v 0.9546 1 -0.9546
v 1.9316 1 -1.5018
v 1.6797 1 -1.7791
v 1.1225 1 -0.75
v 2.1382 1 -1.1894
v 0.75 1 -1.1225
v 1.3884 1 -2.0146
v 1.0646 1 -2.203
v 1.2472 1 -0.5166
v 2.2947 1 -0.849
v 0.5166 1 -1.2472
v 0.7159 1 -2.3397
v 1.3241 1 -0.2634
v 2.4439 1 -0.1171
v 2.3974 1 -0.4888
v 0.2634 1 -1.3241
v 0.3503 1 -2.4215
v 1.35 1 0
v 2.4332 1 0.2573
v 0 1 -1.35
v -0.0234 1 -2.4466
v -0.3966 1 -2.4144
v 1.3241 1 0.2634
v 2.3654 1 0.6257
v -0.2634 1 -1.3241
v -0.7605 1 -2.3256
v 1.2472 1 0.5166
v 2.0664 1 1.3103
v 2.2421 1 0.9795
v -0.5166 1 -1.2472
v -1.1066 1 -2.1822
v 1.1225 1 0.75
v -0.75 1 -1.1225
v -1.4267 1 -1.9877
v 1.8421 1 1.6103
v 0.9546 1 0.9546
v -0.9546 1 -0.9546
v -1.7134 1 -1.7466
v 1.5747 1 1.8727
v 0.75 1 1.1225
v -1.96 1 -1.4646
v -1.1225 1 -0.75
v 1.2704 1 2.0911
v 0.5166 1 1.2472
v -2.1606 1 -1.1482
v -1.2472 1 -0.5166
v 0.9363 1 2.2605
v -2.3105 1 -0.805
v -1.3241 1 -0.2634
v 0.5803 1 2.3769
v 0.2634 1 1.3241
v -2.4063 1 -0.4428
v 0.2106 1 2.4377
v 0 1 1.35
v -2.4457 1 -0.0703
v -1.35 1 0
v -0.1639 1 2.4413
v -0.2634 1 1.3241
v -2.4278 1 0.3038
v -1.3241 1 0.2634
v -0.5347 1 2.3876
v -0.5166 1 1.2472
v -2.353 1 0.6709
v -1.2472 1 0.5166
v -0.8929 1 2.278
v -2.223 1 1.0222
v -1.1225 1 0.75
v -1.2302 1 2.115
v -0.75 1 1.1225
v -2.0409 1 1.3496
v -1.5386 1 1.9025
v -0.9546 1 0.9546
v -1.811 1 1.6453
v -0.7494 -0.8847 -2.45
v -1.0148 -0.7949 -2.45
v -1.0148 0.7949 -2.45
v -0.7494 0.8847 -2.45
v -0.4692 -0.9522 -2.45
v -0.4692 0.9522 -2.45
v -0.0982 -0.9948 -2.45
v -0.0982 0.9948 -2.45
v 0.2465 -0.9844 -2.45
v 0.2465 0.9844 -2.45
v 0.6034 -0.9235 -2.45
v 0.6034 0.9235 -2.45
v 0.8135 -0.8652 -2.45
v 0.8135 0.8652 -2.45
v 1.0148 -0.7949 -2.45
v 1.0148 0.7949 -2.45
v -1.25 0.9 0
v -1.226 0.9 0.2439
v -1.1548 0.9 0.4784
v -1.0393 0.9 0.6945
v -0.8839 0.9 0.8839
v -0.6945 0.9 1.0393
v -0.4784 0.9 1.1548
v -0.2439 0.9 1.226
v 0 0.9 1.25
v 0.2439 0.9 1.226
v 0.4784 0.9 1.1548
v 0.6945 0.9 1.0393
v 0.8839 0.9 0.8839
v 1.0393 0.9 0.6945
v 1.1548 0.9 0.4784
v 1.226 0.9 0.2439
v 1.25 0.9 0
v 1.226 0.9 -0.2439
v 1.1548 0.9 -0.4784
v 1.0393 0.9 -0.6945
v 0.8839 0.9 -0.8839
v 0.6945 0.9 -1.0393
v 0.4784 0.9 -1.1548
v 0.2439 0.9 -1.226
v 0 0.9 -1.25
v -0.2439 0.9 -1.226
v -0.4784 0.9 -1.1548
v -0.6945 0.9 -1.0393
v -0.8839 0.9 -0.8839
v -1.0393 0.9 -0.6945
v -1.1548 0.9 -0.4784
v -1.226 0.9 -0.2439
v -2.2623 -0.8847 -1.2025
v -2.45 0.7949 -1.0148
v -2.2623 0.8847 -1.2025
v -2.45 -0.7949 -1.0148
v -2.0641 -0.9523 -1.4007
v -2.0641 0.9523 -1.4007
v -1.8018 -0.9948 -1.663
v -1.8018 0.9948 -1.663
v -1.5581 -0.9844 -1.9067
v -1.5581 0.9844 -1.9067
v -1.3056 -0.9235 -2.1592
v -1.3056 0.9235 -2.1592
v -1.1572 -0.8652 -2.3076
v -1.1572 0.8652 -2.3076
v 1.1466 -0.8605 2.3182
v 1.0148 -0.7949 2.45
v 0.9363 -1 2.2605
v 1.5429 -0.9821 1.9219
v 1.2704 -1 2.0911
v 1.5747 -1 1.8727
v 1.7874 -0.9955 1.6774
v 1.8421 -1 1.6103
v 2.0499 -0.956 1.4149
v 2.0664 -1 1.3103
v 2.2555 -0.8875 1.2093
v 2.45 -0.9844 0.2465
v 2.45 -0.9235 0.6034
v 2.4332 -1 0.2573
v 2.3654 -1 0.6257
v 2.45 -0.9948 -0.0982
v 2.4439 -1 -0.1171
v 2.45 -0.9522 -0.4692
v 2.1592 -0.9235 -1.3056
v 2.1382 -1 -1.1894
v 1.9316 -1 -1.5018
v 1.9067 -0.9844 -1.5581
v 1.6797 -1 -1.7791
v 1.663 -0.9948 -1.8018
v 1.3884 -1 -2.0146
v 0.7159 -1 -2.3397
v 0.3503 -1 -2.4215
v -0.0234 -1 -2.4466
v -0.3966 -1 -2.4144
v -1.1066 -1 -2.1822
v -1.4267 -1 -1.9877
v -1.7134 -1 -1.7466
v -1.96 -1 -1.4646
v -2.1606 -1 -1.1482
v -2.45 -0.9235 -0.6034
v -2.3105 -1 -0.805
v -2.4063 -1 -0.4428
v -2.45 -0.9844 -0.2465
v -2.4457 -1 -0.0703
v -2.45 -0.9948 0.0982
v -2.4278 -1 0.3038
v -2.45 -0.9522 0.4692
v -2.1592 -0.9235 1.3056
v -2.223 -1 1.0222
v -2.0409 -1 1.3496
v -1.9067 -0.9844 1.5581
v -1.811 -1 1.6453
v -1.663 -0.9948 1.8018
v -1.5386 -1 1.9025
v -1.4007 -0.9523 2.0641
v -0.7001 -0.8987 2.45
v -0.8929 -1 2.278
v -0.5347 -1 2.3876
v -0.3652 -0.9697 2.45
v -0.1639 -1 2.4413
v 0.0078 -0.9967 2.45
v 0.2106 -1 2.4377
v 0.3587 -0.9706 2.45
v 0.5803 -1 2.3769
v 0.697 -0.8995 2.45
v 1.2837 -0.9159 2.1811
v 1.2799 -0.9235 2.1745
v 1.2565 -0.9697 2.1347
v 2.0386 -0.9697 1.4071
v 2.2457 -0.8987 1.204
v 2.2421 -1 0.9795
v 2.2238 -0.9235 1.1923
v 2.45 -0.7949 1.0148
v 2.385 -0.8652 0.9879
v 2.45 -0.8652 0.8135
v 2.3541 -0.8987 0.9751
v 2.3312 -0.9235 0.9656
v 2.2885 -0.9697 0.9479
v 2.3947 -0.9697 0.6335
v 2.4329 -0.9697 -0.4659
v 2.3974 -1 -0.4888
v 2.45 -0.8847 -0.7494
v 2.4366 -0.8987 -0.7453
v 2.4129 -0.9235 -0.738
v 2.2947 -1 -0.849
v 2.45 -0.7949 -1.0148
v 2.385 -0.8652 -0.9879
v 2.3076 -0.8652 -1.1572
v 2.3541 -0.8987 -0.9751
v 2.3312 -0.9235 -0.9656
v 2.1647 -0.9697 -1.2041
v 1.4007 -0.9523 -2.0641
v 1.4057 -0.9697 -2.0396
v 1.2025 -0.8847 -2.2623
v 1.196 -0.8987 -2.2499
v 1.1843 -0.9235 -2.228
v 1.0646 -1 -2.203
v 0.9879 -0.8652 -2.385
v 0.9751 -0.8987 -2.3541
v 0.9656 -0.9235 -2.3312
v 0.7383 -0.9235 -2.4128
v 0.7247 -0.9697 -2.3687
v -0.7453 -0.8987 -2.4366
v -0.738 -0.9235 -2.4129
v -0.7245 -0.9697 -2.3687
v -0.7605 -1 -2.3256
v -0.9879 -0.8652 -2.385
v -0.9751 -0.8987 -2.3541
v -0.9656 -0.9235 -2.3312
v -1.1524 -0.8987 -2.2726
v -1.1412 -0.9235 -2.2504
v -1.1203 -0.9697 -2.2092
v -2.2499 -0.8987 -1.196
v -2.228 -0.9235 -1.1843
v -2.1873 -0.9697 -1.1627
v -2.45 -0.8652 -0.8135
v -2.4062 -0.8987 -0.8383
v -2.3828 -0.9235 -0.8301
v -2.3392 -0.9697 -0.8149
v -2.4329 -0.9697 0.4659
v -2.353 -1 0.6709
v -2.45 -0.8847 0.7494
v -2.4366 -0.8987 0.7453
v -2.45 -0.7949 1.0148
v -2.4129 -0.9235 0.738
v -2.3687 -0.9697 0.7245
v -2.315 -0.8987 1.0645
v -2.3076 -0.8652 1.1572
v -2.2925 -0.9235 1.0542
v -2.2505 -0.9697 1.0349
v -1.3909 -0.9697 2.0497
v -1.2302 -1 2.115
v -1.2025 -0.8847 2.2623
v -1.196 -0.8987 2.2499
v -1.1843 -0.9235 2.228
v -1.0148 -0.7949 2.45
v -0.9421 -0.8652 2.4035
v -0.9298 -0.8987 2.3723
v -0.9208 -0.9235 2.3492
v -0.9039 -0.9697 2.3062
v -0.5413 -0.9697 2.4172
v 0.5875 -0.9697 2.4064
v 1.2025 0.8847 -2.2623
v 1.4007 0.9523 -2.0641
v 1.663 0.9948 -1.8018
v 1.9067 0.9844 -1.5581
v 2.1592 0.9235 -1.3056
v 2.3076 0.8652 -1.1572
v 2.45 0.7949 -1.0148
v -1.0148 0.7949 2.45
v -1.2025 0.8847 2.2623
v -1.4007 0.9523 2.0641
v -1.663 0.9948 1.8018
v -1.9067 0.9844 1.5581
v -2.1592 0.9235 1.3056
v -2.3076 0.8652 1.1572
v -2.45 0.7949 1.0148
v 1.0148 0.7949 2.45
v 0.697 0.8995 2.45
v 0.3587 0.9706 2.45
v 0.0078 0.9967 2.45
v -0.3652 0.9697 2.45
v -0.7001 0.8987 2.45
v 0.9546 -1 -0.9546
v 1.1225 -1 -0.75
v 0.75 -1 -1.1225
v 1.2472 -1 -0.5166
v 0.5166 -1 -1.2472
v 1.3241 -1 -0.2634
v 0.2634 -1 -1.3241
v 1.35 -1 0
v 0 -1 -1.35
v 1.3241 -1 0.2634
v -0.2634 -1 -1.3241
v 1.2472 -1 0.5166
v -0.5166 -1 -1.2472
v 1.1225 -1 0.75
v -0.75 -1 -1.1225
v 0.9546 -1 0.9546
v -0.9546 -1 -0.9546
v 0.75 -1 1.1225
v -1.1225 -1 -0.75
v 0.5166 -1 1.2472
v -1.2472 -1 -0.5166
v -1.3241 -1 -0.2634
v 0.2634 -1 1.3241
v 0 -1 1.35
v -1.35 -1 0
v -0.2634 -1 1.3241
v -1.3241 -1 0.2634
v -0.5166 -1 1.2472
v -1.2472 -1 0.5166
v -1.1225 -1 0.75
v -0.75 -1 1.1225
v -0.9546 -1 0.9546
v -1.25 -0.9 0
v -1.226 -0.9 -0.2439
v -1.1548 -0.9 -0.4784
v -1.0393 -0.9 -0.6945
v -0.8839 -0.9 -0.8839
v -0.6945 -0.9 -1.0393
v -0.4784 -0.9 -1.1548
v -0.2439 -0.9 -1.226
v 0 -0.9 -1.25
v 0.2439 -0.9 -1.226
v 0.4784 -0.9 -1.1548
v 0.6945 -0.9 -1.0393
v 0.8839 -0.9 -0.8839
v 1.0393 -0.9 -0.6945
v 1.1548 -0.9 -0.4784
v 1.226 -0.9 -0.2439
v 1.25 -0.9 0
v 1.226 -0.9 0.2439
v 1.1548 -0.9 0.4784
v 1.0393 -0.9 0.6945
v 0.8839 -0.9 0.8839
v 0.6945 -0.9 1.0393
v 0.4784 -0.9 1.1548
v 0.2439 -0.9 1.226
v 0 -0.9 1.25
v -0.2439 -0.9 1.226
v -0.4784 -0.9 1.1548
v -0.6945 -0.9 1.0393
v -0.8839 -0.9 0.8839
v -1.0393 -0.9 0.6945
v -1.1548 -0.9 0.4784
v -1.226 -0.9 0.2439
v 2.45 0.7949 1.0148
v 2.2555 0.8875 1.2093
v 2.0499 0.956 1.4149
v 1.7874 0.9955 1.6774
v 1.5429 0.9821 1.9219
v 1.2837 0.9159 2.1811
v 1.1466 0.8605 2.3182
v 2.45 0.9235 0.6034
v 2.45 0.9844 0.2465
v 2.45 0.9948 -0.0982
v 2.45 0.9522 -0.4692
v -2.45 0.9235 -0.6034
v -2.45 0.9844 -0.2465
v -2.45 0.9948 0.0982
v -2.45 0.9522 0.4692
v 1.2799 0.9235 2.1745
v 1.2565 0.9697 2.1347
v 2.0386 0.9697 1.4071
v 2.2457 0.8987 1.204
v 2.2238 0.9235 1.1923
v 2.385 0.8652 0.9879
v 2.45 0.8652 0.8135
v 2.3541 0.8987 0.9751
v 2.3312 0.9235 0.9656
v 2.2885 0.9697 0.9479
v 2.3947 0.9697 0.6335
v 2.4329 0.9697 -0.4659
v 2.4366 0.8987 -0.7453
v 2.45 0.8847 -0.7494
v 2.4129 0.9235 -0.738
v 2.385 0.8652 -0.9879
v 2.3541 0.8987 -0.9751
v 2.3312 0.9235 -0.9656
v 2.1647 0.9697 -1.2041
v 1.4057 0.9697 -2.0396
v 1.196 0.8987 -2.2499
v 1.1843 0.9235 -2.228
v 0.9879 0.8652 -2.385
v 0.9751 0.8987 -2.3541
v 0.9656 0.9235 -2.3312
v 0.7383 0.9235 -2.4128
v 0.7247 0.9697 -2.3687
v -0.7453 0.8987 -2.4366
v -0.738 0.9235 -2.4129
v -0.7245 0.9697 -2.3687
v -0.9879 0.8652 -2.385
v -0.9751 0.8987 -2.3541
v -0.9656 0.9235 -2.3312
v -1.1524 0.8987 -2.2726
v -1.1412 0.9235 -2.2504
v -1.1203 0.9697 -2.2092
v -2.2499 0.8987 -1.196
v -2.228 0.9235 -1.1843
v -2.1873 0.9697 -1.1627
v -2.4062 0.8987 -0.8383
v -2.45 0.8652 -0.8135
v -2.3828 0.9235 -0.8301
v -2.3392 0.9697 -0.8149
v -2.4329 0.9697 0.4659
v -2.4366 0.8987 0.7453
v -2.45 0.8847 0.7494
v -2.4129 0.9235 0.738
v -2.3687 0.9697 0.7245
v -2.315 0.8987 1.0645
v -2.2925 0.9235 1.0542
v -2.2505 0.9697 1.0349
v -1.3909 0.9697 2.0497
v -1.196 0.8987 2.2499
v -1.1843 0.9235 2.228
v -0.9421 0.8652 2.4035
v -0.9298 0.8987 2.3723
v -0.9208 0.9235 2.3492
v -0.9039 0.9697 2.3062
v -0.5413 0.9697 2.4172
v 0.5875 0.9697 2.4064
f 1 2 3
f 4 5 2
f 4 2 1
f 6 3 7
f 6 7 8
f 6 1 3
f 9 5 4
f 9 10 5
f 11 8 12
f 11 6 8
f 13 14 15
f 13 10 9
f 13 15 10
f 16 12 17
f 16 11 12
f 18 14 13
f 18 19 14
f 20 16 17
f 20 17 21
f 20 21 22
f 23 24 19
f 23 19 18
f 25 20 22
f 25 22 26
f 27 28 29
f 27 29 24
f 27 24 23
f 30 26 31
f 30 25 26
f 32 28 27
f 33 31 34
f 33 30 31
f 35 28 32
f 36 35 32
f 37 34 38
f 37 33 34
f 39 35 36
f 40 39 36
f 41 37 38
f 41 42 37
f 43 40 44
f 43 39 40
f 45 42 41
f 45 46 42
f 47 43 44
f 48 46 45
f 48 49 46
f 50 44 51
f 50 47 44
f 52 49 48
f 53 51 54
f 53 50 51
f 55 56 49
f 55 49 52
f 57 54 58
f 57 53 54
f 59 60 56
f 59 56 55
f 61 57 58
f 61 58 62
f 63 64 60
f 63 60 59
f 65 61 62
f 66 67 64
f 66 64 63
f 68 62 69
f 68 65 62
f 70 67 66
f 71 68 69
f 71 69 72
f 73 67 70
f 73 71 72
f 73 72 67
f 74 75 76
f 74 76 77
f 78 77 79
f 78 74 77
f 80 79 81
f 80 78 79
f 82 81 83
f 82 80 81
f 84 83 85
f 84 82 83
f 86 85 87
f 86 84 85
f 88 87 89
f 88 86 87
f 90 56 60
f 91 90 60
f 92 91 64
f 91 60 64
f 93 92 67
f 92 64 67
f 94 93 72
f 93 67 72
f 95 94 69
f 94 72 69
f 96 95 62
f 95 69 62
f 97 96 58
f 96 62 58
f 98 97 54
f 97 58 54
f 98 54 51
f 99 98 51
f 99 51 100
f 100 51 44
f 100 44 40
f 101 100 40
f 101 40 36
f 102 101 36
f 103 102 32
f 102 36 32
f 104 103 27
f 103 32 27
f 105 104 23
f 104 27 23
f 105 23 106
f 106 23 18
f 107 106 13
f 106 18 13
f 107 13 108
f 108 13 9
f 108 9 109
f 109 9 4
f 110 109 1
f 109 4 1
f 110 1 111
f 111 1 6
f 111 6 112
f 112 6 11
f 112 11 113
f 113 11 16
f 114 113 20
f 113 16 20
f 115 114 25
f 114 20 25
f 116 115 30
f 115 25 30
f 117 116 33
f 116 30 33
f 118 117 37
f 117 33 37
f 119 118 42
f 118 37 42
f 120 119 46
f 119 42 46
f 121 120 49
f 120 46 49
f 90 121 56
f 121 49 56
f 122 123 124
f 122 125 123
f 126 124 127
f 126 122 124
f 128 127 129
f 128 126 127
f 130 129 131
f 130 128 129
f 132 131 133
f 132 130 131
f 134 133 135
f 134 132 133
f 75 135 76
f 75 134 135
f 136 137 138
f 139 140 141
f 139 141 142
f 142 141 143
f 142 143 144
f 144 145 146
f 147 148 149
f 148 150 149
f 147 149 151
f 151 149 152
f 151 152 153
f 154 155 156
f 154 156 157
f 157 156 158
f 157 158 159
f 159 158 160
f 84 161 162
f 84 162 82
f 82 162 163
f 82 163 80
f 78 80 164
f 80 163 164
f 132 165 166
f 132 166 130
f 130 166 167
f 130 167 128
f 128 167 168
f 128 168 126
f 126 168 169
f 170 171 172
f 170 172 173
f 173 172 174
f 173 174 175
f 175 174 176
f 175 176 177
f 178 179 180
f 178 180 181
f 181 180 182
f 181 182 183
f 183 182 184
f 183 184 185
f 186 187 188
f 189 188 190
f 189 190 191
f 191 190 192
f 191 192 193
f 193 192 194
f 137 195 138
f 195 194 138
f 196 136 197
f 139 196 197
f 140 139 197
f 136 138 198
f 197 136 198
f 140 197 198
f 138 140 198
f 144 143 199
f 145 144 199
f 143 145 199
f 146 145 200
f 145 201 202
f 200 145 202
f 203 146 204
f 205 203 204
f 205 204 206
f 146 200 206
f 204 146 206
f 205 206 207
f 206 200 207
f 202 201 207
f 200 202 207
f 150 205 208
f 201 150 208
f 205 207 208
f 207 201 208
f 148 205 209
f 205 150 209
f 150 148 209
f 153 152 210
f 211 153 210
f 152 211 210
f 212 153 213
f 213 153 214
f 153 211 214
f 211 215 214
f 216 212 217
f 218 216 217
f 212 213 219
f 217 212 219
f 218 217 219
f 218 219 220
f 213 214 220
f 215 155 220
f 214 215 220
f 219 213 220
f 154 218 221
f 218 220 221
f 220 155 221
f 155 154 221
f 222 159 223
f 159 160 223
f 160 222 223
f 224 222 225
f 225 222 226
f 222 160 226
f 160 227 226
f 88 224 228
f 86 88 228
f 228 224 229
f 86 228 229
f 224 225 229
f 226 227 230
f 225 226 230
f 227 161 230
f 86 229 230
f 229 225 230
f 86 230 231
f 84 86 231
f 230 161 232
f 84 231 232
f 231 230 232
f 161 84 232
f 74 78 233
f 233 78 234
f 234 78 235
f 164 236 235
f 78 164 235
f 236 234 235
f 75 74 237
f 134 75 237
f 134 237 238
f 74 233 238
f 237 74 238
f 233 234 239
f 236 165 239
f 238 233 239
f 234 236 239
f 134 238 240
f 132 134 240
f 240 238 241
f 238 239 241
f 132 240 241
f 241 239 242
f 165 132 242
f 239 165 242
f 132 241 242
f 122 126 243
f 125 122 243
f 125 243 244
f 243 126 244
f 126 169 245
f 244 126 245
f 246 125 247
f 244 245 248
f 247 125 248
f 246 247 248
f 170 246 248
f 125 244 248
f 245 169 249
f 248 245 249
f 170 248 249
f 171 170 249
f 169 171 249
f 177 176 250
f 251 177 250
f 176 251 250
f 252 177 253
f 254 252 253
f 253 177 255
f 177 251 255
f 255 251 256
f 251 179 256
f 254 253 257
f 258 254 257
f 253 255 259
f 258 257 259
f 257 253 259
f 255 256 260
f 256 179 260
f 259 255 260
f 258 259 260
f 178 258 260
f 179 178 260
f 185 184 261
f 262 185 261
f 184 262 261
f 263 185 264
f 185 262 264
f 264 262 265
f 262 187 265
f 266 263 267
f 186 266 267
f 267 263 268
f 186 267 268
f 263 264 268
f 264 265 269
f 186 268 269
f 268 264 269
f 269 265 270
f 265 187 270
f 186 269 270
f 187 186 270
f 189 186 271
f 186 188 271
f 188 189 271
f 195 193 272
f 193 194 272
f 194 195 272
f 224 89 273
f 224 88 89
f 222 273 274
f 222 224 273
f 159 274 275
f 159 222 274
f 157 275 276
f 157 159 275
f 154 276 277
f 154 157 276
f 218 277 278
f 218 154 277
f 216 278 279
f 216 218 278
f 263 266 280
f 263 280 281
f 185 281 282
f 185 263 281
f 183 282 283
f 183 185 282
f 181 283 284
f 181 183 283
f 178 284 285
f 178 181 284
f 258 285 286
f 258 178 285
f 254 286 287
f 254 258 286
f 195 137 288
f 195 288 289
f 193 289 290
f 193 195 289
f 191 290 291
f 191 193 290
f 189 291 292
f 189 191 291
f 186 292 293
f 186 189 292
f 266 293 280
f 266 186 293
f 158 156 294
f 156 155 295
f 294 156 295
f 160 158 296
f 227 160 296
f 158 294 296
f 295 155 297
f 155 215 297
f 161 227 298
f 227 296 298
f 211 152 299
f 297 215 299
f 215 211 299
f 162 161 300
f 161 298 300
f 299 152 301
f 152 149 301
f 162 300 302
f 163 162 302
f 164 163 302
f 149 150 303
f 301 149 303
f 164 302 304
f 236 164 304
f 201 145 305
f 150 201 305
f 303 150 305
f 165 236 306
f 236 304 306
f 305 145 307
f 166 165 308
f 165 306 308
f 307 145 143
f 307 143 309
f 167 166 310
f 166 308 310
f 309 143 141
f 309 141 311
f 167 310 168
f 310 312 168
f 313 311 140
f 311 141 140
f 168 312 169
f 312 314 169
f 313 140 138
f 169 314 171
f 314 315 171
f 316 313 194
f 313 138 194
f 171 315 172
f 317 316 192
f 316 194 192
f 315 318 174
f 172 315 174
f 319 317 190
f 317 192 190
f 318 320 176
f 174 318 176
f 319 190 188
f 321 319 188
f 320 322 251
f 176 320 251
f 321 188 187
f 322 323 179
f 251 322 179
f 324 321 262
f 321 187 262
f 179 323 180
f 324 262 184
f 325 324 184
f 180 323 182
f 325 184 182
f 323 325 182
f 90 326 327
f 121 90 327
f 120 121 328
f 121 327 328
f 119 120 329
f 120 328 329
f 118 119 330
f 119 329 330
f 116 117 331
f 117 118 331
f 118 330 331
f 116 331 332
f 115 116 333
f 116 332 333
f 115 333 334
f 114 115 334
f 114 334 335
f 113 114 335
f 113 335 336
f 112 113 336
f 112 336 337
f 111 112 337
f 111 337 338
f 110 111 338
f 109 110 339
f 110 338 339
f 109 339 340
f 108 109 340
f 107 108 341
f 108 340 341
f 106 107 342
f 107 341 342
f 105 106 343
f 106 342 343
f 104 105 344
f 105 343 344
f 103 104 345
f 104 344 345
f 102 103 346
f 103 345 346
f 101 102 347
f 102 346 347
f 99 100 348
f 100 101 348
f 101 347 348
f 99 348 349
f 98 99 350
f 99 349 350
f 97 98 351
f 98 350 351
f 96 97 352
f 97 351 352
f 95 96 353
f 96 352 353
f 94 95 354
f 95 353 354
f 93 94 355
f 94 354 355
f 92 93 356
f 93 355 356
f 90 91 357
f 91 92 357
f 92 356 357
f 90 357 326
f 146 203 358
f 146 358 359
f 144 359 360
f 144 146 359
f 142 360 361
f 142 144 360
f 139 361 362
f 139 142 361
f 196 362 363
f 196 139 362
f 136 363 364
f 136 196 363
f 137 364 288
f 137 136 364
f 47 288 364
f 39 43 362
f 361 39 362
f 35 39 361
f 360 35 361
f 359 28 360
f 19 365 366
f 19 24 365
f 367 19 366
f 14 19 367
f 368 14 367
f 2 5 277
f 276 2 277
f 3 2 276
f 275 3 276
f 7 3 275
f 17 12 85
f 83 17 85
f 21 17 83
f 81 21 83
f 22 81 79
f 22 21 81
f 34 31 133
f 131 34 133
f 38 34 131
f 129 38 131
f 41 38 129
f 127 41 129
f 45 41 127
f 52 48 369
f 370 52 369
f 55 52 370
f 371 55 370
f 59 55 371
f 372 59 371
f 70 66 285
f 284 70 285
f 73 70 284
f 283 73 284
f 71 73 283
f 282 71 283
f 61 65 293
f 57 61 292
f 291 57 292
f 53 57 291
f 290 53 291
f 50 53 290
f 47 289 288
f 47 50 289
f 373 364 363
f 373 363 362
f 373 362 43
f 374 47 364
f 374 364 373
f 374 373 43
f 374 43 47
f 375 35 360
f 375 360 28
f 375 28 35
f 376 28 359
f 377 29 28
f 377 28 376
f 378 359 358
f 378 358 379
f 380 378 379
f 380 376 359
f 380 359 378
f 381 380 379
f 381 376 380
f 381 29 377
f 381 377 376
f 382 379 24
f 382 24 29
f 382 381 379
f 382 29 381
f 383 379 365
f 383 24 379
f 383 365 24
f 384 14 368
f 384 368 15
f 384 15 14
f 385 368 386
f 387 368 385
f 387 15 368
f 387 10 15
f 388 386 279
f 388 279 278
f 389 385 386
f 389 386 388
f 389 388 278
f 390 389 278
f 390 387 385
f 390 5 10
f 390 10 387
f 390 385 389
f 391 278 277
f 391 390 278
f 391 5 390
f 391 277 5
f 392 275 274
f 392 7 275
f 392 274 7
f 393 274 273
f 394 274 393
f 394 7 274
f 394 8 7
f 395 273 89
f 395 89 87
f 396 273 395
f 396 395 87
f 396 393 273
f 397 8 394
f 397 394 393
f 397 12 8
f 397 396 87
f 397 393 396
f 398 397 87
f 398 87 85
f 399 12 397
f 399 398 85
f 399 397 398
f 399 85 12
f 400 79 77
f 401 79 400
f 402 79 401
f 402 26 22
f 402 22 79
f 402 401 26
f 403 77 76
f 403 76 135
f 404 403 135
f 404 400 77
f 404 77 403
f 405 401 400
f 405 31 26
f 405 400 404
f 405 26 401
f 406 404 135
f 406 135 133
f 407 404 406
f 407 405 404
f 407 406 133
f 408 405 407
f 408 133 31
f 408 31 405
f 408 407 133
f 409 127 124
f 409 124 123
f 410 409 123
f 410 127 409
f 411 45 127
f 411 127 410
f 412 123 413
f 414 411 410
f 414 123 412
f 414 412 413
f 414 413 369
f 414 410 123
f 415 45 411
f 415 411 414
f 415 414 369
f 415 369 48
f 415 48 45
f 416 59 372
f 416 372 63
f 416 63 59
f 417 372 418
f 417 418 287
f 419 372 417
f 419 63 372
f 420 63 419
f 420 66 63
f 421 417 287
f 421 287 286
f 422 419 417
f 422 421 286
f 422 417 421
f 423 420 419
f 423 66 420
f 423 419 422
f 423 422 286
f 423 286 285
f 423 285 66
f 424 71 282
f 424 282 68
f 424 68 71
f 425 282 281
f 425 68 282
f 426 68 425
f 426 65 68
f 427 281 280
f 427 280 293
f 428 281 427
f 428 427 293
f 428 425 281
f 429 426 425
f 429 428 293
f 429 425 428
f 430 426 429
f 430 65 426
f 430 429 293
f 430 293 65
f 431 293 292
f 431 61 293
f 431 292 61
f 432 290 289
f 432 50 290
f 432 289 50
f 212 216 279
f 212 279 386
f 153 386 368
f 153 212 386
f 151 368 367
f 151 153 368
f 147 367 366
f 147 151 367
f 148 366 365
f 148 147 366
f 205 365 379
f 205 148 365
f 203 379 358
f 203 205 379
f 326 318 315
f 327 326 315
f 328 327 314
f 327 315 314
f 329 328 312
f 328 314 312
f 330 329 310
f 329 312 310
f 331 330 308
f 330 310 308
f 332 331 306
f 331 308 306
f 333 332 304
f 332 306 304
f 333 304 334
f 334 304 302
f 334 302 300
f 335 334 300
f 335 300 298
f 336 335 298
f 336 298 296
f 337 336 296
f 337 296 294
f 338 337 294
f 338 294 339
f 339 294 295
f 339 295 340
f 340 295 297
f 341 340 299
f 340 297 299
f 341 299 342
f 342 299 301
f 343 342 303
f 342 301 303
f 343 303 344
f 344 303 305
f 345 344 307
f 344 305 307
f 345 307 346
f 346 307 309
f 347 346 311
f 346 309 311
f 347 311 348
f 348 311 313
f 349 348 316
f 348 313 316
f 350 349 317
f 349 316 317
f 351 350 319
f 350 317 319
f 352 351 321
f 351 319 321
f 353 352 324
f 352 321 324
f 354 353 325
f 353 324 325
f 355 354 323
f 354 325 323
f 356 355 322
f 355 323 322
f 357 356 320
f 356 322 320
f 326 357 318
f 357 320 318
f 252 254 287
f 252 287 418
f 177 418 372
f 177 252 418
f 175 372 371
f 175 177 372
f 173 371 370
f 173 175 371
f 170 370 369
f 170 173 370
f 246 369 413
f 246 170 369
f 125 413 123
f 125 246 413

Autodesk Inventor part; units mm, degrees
ref_plane "YZ Plane" through (0, 0, 0) normal (1, 0, 0) x (0, 1, 0)
ref_plane "XZ Plane" through (0, 0, 0) normal (0, 1, 0) x (-1, 0, 0)
sketch "Sketch1" plane through (0, 0, 0) normal (0, 1, 0) x (-1, 0, 0)
  line L0 (2.45, 1.0148) -> (2.45, -1.0148)
  line L1 (2.45, -1.0148) -> (1.0148, -2.45)
  line L2 (1.0148, -2.45) -> (-1.0148, -2.45)
  line L3 (-1.0148, -2.45) -> (-2.45, -1.0148)
  line L4 (-2.45, -1.0148) -> (-2.45, 1.0148)
  line L5 (-2.45, 1.0148) -> (-1.0148, 2.45)
  line L6 (-1.0148, 2.45) -> (1.0148, 2.45)
  line L7 (1.0148, 2.45) -> (2.45, 1.0148)
  circle A0 centre (0, 0) radius 1.25
  point P0 (2.45, 0)
  point P1 (0, -2.45)
  dimension "d0" = 135
  dimension "d1" = 4.9
  dimension "d4" = 2.5
extrude "Extrusion1" add sketch "Sketch1" along normal mid plane 2
thread "Thread1" size "M2.5x0.45" class "6H" standard "ANSI Metric M Profile" full length
ref_plane "Work Plane1" through (1.0148, -1, 2.45) normal (0.9239, 0, -0.3827) x (-0.3827, 0, -0.9239)
sketch "Sketch3" plane through (1.0148, -1, 2.45) normal (0.9239, 0, -0.3827) x (-0.3827, 0, -0.9239)
  line L0 (0, 0) -> (0.7767, 0) projected
  line L1 (0, 2) -> (0, 0) projected
  line L2 (2.6519, -0.4) -> (2.6519, 2.4) projected
  line L3 (0, 0.2051) -> (0.2051, 0)
  line L4 (0.7767, 0) -> (0, 0) projected
  point P0 (2.6519, 1)
  dimension "d10" = 45
  dimension "d11" = 0.29
revolve "Revolution1" cut sketch "Sketch3" angle 360 about axis through (0, -10, 0) along (0, 1, 0)
mirror "Mirror1" about plane through (0, 0, 0) normal (0, 1, 0) of "Revolution1"
chamfer "Chamfer1" distance 0.1 angle 45 1 edges at (1.25, -1, 0)
chamfer "Chamfer2" distance 0.1 angle 45 1 edges at (1.25, 1, 0)
properties part number "2.5mm hex nut" material "Steel, High Strength, Low Alloy"
